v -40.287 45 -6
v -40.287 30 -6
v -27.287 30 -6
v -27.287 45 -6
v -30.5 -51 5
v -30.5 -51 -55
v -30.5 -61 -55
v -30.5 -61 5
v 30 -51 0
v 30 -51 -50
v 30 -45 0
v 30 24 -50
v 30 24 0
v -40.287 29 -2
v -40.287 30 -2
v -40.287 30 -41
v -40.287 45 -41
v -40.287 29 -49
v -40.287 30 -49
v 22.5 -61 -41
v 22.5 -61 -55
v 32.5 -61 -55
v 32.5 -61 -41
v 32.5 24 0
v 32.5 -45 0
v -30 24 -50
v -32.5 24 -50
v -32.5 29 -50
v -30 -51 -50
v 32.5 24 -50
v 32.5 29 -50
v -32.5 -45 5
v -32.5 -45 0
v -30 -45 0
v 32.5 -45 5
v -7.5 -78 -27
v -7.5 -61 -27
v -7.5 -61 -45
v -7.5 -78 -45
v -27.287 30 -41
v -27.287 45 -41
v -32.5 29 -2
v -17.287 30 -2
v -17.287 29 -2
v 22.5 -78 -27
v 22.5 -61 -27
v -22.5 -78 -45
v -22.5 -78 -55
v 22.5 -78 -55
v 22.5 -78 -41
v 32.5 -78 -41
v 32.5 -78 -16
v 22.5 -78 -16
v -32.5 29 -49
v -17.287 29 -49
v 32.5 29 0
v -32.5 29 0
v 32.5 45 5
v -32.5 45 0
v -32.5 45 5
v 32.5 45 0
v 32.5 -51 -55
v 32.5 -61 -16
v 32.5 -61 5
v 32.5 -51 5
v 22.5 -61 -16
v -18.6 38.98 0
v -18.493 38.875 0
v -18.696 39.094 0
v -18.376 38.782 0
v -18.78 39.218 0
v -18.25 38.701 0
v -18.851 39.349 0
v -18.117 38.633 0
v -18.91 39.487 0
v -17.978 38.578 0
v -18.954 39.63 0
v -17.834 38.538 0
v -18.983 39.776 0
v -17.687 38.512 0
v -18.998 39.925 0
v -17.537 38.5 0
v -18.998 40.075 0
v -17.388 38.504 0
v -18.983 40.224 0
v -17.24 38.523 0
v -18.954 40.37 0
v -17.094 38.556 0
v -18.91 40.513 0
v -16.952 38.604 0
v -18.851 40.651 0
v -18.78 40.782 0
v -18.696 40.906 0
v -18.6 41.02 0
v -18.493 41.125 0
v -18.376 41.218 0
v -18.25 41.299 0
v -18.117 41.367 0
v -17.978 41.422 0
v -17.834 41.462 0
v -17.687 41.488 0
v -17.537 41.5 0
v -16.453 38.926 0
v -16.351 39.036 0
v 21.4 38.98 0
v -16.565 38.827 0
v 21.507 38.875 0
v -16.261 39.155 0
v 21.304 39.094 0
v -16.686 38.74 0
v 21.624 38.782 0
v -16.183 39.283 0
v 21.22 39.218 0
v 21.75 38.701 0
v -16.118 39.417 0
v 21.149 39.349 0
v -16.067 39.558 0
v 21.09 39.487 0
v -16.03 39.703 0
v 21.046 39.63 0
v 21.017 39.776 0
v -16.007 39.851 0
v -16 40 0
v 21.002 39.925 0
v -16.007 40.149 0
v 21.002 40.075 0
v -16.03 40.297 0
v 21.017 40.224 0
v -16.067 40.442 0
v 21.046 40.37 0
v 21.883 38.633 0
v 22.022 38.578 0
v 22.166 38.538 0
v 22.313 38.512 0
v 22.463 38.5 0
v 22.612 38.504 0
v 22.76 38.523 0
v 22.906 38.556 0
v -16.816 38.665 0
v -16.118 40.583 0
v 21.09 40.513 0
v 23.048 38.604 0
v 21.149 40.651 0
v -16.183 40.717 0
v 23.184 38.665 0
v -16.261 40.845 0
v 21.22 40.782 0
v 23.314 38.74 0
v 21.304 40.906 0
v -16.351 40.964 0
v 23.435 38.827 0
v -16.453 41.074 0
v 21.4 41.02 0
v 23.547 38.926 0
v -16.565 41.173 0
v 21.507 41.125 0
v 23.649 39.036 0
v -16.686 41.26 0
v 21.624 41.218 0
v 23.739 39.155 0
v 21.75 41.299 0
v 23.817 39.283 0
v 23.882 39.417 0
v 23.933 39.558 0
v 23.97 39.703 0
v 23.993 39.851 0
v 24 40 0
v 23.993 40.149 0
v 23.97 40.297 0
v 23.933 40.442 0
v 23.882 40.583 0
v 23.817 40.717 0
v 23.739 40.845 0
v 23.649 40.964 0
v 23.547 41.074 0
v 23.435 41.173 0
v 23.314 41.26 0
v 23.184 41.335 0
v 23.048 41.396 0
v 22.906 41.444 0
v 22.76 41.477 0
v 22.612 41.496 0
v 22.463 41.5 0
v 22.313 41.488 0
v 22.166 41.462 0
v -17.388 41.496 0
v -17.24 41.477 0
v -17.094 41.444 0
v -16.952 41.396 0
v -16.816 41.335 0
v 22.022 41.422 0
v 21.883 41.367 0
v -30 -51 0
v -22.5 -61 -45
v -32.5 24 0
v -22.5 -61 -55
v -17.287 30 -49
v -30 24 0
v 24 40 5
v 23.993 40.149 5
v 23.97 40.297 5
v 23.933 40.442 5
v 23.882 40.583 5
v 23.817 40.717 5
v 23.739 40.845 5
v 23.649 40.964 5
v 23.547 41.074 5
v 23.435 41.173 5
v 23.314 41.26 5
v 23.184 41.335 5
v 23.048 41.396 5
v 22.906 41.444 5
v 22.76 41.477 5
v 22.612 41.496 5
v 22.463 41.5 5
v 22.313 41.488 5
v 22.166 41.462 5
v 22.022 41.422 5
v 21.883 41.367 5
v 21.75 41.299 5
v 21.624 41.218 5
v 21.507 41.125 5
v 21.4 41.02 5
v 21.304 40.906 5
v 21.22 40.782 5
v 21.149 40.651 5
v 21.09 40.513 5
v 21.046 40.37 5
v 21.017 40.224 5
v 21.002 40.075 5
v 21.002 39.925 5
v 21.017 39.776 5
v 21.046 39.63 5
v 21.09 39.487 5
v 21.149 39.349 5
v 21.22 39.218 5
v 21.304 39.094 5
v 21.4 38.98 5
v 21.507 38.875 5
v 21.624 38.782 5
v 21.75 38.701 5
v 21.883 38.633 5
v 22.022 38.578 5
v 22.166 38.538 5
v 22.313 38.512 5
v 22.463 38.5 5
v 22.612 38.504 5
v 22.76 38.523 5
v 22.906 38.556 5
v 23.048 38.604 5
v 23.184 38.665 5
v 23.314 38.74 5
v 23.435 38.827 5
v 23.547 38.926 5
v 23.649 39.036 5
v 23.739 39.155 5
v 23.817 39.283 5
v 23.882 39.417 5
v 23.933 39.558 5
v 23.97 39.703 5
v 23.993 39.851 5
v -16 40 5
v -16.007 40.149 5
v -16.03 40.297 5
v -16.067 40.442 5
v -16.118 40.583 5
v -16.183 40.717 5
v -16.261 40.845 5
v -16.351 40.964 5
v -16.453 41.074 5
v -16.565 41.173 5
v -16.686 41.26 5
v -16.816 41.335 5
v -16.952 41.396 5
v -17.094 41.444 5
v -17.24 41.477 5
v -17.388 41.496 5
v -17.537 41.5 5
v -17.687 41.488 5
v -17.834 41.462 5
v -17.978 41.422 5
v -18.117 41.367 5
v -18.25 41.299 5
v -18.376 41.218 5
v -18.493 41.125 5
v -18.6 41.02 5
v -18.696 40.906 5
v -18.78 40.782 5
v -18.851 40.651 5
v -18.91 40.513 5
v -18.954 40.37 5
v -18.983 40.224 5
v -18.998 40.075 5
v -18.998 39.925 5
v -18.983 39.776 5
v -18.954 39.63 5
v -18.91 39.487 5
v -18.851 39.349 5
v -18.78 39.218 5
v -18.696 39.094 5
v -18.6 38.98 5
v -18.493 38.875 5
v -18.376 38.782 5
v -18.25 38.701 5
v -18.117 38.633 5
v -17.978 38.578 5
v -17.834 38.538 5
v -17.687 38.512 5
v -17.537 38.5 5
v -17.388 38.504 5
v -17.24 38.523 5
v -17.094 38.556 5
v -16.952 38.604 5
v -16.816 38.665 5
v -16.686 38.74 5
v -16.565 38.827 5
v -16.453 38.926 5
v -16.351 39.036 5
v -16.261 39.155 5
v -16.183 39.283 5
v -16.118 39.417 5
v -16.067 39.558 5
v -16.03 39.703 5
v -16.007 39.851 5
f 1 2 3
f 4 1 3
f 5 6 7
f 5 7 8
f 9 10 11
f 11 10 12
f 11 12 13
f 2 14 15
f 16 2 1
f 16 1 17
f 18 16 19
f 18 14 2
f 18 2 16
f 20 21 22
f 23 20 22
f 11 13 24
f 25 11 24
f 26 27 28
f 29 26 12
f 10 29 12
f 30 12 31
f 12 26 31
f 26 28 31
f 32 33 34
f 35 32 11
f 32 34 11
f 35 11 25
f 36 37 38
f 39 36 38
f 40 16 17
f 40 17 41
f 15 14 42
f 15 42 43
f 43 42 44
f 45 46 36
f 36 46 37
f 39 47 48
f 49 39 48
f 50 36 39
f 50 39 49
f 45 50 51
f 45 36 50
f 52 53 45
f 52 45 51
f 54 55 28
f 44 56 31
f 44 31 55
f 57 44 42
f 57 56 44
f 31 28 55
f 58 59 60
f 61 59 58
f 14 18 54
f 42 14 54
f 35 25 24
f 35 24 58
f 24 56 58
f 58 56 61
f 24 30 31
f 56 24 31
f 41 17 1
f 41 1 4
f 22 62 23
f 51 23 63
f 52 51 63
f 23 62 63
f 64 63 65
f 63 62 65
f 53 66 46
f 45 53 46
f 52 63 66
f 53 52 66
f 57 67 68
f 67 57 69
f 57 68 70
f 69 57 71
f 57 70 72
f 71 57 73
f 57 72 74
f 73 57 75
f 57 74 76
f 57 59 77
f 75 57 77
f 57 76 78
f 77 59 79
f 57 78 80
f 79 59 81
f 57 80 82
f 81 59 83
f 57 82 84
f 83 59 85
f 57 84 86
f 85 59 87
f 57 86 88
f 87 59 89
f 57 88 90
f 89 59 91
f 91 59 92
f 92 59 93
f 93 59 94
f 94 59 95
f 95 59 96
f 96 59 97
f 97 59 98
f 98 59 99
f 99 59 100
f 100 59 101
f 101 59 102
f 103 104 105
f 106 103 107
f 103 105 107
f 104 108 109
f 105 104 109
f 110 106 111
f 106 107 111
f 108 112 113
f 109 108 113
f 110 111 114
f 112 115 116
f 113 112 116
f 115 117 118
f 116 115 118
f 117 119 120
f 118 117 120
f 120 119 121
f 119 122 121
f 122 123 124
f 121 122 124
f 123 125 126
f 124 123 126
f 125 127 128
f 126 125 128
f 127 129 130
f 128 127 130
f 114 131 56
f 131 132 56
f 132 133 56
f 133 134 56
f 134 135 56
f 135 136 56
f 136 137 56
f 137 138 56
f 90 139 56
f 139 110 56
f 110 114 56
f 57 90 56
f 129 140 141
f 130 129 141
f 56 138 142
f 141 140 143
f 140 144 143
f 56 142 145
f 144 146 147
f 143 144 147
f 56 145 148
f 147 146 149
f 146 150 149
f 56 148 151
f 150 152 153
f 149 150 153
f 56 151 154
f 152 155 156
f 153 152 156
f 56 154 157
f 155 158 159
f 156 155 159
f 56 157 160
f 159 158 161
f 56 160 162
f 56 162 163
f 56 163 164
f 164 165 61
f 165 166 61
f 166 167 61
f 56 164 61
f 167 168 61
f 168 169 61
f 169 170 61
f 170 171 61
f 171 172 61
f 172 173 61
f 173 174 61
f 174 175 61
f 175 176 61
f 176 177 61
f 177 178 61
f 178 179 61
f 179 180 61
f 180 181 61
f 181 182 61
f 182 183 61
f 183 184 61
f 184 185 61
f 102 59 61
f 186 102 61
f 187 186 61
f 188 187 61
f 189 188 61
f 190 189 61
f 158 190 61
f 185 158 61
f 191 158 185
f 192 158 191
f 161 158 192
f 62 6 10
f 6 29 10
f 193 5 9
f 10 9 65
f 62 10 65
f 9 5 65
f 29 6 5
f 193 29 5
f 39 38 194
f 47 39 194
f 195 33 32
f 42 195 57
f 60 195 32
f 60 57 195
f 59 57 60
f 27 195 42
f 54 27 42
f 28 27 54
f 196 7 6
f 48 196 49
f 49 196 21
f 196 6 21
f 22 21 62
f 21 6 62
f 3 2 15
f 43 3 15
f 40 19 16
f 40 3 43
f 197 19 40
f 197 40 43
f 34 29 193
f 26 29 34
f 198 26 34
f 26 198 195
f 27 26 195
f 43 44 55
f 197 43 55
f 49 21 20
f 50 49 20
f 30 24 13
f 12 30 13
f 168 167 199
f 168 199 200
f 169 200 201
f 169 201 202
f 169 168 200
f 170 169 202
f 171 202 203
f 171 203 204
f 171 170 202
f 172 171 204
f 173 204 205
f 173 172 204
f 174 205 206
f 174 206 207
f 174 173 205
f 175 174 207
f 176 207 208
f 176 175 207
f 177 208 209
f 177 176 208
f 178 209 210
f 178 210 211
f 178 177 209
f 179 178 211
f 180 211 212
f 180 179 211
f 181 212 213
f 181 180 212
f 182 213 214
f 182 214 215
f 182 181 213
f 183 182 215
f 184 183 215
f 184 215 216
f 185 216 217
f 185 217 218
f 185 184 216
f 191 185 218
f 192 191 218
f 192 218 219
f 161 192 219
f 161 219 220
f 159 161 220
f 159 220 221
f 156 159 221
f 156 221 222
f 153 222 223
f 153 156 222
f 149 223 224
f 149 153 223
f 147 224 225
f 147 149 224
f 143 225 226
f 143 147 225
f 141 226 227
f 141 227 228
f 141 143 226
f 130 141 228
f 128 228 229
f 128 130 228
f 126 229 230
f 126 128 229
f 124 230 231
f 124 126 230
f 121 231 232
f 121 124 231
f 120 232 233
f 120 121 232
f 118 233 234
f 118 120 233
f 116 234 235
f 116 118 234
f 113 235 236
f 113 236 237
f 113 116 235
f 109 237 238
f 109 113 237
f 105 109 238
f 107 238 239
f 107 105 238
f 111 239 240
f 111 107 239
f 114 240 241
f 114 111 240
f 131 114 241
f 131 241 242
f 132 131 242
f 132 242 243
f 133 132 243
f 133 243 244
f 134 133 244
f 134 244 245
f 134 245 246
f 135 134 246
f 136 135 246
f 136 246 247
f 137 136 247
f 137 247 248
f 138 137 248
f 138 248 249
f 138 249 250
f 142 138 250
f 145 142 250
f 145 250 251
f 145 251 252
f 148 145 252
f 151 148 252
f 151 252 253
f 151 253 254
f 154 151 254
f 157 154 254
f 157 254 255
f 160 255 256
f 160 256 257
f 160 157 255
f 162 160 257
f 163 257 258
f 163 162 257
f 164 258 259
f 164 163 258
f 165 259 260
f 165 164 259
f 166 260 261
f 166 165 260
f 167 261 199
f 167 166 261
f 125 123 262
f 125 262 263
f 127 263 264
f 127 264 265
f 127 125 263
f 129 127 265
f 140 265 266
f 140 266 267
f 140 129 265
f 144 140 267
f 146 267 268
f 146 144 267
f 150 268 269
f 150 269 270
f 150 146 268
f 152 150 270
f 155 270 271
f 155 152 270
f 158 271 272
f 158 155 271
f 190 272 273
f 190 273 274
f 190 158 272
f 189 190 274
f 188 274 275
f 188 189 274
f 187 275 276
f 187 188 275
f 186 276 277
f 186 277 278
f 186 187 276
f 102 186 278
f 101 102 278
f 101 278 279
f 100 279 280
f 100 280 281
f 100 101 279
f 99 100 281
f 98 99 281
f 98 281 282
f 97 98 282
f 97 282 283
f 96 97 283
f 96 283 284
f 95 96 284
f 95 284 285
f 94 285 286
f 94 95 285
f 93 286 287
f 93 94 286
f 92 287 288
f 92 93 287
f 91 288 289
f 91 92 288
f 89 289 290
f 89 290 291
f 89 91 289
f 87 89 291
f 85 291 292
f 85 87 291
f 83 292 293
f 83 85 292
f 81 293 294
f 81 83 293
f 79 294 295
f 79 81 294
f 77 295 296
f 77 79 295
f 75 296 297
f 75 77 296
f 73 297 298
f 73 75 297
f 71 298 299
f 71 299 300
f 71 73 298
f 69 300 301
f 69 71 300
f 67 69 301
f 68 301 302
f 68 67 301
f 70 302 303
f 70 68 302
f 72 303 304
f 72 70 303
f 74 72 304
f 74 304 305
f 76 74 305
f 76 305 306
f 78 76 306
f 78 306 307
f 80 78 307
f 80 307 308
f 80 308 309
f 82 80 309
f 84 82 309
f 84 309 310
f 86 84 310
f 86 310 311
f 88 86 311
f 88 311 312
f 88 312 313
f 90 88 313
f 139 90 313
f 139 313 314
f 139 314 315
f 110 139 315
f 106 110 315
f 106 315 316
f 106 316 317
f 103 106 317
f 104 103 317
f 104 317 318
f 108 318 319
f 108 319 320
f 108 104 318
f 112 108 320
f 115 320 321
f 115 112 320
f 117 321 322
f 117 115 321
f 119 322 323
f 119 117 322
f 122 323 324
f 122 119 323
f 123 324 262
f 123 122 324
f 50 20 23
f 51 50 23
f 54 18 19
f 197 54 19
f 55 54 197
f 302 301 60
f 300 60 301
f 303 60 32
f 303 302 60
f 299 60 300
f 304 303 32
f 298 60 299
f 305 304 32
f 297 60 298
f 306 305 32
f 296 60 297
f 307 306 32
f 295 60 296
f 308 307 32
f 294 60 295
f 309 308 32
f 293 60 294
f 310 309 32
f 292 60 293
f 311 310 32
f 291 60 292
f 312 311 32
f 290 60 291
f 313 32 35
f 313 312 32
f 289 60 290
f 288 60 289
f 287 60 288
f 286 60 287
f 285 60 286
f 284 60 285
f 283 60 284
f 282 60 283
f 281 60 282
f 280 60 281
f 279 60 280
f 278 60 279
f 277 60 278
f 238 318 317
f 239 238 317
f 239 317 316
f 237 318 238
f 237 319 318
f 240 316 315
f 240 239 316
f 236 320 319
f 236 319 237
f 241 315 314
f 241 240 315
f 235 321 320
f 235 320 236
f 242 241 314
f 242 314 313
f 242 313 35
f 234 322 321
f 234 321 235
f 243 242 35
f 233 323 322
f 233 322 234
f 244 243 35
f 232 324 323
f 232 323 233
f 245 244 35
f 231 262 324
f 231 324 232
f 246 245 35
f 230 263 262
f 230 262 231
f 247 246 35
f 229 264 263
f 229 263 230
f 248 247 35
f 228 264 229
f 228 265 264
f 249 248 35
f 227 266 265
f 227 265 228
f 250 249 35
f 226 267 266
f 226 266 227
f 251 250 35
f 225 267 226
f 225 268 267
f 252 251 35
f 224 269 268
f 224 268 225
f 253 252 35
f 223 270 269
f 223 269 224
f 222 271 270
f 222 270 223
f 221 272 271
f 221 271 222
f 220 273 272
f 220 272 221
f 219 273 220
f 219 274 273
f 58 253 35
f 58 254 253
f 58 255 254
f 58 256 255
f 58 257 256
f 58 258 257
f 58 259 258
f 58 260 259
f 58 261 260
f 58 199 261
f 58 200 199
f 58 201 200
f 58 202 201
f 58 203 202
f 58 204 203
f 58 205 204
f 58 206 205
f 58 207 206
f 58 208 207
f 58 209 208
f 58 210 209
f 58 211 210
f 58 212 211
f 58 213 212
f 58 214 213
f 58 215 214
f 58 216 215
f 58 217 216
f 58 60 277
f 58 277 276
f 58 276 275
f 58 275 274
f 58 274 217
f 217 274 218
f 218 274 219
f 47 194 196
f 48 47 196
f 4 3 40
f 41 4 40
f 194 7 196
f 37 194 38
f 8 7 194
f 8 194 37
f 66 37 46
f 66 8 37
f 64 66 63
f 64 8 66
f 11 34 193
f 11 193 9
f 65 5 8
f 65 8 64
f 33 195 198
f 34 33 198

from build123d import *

# Parameters (mm, degrees)
SKETCH2_W           = 65
SKETCH2_H           = 90
SKETCH2_R           = 1.5
BOSS_EXTRUDE1_DEPTH = 5
SKETCH3_W           = 65
SKETCH3_H           = 5
BOSS_EXTRUDE2_DEPTH = 50
SKETCH4_W           = 23
SKETCH4_H           = 47
BOSS_EXTRUDE3_DEPTH = 1
SKETCH5_W           = 13
SKETCH5_H           = 35
BOSS_EXTRUDE4_DEPTH = 15
SKETCH6_W           = 60
SKETCH6_H           = 50
BOSS_EXTRUDE5_DEPTH = 75
SKETCH7_W           = 63
SKETCH7_H           = 60
BOSS_EXTRUDE6_DEPTH = 10
BOSS_EXTRUDE7_DEPTH = 17


with BuildPart() as part:
    # Sketch2 → Boss-Extrude1 (new body)
    with BuildSketch(Plane.XY):
        Rectangle(SKETCH2_W, SKETCH2_H)
        with Locations((-17.5, 40)):
            Circle(SKETCH2_R, mode=Mode.SUBTRACT)
        with Locations((22.5, 40)):
            Circle(SKETCH2_R, mode=Mode.SUBTRACT)
    extrude(amount=BOSS_EXTRUDE1_DEPTH)

    # Sketch3 → Boss-Extrude2 (add)
    with BuildSketch(Plane(origin=(0, 0, 0), x_dir=(-1, 0, 0), z_dir=(0, 0, -1))):
        with Locations((0, 26.5)):
            Rectangle(SKETCH3_W, SKETCH3_H)
    extrude(amount=BOSS_EXTRUDE2_DEPTH)

    # Sketch4 → Boss-Extrude3 (add)
    with BuildSketch(Plane(origin=(0, 29, 0), x_dir=(1, 0, 0), z_dir=(0, 1, 0))):
        with Locations((-28.787234074, 25.5)):
            Rectangle(SKETCH4_W, SKETCH4_H)
    extrude(amount=BOSS_EXTRUDE3_DEPTH)

    # Sketch5 → Boss-Extrude4 (add)
    with BuildSketch(Plane(origin=(0, 30, 0), x_dir=(1, 0, 0), z_dir=(0, 1, 0))):
        with Locations((-33.787234074, 23.5)):
            Rectangle(SKETCH5_W, SKETCH5_H)
    extrude(amount=BOSS_EXTRUDE4_DEPTH)

    # Sketch6 → Boss-Extrude5 (add)
    with BuildSketch(Plane.XZ.offset(-24)):
        with Locations((0, -25)):
            Rectangle(SKETCH6_W, SKETCH6_H)
    extrude(amount=BOSS_EXTRUDE5_DEPTH)

    # Sketch7 → Boss-Extrude6 (add)
    with BuildSketch(Plane.XZ.offset(51)):
        with Locations((1, -25)):
            Rectangle(SKETCH7_W, SKETCH7_H)
    extrude(amount=BOSS_EXTRUDE6_DEPTH)

    # Sketch8 → Boss-Extrude7 (add)
    with BuildSketch(Plane.XZ.offset(61)):
        Polygon((-7.5, -45), (22.5, -45), (22.5, -41), (22.5, -27), (-7.5, -27), align=None)
        Polygon((22.5, -55), (22.5, -45), (-7.5, -45), (-22.5, -45), (-22.5, -55), align=None)
        Polygon((22.5, -27), (22.5, -41), (32.5, -41), (32.5, -16), (22.5, -16), align=None)
    extrude(amount=BOSS_EXTRUDE7_DEPTH)


solid = part.part
